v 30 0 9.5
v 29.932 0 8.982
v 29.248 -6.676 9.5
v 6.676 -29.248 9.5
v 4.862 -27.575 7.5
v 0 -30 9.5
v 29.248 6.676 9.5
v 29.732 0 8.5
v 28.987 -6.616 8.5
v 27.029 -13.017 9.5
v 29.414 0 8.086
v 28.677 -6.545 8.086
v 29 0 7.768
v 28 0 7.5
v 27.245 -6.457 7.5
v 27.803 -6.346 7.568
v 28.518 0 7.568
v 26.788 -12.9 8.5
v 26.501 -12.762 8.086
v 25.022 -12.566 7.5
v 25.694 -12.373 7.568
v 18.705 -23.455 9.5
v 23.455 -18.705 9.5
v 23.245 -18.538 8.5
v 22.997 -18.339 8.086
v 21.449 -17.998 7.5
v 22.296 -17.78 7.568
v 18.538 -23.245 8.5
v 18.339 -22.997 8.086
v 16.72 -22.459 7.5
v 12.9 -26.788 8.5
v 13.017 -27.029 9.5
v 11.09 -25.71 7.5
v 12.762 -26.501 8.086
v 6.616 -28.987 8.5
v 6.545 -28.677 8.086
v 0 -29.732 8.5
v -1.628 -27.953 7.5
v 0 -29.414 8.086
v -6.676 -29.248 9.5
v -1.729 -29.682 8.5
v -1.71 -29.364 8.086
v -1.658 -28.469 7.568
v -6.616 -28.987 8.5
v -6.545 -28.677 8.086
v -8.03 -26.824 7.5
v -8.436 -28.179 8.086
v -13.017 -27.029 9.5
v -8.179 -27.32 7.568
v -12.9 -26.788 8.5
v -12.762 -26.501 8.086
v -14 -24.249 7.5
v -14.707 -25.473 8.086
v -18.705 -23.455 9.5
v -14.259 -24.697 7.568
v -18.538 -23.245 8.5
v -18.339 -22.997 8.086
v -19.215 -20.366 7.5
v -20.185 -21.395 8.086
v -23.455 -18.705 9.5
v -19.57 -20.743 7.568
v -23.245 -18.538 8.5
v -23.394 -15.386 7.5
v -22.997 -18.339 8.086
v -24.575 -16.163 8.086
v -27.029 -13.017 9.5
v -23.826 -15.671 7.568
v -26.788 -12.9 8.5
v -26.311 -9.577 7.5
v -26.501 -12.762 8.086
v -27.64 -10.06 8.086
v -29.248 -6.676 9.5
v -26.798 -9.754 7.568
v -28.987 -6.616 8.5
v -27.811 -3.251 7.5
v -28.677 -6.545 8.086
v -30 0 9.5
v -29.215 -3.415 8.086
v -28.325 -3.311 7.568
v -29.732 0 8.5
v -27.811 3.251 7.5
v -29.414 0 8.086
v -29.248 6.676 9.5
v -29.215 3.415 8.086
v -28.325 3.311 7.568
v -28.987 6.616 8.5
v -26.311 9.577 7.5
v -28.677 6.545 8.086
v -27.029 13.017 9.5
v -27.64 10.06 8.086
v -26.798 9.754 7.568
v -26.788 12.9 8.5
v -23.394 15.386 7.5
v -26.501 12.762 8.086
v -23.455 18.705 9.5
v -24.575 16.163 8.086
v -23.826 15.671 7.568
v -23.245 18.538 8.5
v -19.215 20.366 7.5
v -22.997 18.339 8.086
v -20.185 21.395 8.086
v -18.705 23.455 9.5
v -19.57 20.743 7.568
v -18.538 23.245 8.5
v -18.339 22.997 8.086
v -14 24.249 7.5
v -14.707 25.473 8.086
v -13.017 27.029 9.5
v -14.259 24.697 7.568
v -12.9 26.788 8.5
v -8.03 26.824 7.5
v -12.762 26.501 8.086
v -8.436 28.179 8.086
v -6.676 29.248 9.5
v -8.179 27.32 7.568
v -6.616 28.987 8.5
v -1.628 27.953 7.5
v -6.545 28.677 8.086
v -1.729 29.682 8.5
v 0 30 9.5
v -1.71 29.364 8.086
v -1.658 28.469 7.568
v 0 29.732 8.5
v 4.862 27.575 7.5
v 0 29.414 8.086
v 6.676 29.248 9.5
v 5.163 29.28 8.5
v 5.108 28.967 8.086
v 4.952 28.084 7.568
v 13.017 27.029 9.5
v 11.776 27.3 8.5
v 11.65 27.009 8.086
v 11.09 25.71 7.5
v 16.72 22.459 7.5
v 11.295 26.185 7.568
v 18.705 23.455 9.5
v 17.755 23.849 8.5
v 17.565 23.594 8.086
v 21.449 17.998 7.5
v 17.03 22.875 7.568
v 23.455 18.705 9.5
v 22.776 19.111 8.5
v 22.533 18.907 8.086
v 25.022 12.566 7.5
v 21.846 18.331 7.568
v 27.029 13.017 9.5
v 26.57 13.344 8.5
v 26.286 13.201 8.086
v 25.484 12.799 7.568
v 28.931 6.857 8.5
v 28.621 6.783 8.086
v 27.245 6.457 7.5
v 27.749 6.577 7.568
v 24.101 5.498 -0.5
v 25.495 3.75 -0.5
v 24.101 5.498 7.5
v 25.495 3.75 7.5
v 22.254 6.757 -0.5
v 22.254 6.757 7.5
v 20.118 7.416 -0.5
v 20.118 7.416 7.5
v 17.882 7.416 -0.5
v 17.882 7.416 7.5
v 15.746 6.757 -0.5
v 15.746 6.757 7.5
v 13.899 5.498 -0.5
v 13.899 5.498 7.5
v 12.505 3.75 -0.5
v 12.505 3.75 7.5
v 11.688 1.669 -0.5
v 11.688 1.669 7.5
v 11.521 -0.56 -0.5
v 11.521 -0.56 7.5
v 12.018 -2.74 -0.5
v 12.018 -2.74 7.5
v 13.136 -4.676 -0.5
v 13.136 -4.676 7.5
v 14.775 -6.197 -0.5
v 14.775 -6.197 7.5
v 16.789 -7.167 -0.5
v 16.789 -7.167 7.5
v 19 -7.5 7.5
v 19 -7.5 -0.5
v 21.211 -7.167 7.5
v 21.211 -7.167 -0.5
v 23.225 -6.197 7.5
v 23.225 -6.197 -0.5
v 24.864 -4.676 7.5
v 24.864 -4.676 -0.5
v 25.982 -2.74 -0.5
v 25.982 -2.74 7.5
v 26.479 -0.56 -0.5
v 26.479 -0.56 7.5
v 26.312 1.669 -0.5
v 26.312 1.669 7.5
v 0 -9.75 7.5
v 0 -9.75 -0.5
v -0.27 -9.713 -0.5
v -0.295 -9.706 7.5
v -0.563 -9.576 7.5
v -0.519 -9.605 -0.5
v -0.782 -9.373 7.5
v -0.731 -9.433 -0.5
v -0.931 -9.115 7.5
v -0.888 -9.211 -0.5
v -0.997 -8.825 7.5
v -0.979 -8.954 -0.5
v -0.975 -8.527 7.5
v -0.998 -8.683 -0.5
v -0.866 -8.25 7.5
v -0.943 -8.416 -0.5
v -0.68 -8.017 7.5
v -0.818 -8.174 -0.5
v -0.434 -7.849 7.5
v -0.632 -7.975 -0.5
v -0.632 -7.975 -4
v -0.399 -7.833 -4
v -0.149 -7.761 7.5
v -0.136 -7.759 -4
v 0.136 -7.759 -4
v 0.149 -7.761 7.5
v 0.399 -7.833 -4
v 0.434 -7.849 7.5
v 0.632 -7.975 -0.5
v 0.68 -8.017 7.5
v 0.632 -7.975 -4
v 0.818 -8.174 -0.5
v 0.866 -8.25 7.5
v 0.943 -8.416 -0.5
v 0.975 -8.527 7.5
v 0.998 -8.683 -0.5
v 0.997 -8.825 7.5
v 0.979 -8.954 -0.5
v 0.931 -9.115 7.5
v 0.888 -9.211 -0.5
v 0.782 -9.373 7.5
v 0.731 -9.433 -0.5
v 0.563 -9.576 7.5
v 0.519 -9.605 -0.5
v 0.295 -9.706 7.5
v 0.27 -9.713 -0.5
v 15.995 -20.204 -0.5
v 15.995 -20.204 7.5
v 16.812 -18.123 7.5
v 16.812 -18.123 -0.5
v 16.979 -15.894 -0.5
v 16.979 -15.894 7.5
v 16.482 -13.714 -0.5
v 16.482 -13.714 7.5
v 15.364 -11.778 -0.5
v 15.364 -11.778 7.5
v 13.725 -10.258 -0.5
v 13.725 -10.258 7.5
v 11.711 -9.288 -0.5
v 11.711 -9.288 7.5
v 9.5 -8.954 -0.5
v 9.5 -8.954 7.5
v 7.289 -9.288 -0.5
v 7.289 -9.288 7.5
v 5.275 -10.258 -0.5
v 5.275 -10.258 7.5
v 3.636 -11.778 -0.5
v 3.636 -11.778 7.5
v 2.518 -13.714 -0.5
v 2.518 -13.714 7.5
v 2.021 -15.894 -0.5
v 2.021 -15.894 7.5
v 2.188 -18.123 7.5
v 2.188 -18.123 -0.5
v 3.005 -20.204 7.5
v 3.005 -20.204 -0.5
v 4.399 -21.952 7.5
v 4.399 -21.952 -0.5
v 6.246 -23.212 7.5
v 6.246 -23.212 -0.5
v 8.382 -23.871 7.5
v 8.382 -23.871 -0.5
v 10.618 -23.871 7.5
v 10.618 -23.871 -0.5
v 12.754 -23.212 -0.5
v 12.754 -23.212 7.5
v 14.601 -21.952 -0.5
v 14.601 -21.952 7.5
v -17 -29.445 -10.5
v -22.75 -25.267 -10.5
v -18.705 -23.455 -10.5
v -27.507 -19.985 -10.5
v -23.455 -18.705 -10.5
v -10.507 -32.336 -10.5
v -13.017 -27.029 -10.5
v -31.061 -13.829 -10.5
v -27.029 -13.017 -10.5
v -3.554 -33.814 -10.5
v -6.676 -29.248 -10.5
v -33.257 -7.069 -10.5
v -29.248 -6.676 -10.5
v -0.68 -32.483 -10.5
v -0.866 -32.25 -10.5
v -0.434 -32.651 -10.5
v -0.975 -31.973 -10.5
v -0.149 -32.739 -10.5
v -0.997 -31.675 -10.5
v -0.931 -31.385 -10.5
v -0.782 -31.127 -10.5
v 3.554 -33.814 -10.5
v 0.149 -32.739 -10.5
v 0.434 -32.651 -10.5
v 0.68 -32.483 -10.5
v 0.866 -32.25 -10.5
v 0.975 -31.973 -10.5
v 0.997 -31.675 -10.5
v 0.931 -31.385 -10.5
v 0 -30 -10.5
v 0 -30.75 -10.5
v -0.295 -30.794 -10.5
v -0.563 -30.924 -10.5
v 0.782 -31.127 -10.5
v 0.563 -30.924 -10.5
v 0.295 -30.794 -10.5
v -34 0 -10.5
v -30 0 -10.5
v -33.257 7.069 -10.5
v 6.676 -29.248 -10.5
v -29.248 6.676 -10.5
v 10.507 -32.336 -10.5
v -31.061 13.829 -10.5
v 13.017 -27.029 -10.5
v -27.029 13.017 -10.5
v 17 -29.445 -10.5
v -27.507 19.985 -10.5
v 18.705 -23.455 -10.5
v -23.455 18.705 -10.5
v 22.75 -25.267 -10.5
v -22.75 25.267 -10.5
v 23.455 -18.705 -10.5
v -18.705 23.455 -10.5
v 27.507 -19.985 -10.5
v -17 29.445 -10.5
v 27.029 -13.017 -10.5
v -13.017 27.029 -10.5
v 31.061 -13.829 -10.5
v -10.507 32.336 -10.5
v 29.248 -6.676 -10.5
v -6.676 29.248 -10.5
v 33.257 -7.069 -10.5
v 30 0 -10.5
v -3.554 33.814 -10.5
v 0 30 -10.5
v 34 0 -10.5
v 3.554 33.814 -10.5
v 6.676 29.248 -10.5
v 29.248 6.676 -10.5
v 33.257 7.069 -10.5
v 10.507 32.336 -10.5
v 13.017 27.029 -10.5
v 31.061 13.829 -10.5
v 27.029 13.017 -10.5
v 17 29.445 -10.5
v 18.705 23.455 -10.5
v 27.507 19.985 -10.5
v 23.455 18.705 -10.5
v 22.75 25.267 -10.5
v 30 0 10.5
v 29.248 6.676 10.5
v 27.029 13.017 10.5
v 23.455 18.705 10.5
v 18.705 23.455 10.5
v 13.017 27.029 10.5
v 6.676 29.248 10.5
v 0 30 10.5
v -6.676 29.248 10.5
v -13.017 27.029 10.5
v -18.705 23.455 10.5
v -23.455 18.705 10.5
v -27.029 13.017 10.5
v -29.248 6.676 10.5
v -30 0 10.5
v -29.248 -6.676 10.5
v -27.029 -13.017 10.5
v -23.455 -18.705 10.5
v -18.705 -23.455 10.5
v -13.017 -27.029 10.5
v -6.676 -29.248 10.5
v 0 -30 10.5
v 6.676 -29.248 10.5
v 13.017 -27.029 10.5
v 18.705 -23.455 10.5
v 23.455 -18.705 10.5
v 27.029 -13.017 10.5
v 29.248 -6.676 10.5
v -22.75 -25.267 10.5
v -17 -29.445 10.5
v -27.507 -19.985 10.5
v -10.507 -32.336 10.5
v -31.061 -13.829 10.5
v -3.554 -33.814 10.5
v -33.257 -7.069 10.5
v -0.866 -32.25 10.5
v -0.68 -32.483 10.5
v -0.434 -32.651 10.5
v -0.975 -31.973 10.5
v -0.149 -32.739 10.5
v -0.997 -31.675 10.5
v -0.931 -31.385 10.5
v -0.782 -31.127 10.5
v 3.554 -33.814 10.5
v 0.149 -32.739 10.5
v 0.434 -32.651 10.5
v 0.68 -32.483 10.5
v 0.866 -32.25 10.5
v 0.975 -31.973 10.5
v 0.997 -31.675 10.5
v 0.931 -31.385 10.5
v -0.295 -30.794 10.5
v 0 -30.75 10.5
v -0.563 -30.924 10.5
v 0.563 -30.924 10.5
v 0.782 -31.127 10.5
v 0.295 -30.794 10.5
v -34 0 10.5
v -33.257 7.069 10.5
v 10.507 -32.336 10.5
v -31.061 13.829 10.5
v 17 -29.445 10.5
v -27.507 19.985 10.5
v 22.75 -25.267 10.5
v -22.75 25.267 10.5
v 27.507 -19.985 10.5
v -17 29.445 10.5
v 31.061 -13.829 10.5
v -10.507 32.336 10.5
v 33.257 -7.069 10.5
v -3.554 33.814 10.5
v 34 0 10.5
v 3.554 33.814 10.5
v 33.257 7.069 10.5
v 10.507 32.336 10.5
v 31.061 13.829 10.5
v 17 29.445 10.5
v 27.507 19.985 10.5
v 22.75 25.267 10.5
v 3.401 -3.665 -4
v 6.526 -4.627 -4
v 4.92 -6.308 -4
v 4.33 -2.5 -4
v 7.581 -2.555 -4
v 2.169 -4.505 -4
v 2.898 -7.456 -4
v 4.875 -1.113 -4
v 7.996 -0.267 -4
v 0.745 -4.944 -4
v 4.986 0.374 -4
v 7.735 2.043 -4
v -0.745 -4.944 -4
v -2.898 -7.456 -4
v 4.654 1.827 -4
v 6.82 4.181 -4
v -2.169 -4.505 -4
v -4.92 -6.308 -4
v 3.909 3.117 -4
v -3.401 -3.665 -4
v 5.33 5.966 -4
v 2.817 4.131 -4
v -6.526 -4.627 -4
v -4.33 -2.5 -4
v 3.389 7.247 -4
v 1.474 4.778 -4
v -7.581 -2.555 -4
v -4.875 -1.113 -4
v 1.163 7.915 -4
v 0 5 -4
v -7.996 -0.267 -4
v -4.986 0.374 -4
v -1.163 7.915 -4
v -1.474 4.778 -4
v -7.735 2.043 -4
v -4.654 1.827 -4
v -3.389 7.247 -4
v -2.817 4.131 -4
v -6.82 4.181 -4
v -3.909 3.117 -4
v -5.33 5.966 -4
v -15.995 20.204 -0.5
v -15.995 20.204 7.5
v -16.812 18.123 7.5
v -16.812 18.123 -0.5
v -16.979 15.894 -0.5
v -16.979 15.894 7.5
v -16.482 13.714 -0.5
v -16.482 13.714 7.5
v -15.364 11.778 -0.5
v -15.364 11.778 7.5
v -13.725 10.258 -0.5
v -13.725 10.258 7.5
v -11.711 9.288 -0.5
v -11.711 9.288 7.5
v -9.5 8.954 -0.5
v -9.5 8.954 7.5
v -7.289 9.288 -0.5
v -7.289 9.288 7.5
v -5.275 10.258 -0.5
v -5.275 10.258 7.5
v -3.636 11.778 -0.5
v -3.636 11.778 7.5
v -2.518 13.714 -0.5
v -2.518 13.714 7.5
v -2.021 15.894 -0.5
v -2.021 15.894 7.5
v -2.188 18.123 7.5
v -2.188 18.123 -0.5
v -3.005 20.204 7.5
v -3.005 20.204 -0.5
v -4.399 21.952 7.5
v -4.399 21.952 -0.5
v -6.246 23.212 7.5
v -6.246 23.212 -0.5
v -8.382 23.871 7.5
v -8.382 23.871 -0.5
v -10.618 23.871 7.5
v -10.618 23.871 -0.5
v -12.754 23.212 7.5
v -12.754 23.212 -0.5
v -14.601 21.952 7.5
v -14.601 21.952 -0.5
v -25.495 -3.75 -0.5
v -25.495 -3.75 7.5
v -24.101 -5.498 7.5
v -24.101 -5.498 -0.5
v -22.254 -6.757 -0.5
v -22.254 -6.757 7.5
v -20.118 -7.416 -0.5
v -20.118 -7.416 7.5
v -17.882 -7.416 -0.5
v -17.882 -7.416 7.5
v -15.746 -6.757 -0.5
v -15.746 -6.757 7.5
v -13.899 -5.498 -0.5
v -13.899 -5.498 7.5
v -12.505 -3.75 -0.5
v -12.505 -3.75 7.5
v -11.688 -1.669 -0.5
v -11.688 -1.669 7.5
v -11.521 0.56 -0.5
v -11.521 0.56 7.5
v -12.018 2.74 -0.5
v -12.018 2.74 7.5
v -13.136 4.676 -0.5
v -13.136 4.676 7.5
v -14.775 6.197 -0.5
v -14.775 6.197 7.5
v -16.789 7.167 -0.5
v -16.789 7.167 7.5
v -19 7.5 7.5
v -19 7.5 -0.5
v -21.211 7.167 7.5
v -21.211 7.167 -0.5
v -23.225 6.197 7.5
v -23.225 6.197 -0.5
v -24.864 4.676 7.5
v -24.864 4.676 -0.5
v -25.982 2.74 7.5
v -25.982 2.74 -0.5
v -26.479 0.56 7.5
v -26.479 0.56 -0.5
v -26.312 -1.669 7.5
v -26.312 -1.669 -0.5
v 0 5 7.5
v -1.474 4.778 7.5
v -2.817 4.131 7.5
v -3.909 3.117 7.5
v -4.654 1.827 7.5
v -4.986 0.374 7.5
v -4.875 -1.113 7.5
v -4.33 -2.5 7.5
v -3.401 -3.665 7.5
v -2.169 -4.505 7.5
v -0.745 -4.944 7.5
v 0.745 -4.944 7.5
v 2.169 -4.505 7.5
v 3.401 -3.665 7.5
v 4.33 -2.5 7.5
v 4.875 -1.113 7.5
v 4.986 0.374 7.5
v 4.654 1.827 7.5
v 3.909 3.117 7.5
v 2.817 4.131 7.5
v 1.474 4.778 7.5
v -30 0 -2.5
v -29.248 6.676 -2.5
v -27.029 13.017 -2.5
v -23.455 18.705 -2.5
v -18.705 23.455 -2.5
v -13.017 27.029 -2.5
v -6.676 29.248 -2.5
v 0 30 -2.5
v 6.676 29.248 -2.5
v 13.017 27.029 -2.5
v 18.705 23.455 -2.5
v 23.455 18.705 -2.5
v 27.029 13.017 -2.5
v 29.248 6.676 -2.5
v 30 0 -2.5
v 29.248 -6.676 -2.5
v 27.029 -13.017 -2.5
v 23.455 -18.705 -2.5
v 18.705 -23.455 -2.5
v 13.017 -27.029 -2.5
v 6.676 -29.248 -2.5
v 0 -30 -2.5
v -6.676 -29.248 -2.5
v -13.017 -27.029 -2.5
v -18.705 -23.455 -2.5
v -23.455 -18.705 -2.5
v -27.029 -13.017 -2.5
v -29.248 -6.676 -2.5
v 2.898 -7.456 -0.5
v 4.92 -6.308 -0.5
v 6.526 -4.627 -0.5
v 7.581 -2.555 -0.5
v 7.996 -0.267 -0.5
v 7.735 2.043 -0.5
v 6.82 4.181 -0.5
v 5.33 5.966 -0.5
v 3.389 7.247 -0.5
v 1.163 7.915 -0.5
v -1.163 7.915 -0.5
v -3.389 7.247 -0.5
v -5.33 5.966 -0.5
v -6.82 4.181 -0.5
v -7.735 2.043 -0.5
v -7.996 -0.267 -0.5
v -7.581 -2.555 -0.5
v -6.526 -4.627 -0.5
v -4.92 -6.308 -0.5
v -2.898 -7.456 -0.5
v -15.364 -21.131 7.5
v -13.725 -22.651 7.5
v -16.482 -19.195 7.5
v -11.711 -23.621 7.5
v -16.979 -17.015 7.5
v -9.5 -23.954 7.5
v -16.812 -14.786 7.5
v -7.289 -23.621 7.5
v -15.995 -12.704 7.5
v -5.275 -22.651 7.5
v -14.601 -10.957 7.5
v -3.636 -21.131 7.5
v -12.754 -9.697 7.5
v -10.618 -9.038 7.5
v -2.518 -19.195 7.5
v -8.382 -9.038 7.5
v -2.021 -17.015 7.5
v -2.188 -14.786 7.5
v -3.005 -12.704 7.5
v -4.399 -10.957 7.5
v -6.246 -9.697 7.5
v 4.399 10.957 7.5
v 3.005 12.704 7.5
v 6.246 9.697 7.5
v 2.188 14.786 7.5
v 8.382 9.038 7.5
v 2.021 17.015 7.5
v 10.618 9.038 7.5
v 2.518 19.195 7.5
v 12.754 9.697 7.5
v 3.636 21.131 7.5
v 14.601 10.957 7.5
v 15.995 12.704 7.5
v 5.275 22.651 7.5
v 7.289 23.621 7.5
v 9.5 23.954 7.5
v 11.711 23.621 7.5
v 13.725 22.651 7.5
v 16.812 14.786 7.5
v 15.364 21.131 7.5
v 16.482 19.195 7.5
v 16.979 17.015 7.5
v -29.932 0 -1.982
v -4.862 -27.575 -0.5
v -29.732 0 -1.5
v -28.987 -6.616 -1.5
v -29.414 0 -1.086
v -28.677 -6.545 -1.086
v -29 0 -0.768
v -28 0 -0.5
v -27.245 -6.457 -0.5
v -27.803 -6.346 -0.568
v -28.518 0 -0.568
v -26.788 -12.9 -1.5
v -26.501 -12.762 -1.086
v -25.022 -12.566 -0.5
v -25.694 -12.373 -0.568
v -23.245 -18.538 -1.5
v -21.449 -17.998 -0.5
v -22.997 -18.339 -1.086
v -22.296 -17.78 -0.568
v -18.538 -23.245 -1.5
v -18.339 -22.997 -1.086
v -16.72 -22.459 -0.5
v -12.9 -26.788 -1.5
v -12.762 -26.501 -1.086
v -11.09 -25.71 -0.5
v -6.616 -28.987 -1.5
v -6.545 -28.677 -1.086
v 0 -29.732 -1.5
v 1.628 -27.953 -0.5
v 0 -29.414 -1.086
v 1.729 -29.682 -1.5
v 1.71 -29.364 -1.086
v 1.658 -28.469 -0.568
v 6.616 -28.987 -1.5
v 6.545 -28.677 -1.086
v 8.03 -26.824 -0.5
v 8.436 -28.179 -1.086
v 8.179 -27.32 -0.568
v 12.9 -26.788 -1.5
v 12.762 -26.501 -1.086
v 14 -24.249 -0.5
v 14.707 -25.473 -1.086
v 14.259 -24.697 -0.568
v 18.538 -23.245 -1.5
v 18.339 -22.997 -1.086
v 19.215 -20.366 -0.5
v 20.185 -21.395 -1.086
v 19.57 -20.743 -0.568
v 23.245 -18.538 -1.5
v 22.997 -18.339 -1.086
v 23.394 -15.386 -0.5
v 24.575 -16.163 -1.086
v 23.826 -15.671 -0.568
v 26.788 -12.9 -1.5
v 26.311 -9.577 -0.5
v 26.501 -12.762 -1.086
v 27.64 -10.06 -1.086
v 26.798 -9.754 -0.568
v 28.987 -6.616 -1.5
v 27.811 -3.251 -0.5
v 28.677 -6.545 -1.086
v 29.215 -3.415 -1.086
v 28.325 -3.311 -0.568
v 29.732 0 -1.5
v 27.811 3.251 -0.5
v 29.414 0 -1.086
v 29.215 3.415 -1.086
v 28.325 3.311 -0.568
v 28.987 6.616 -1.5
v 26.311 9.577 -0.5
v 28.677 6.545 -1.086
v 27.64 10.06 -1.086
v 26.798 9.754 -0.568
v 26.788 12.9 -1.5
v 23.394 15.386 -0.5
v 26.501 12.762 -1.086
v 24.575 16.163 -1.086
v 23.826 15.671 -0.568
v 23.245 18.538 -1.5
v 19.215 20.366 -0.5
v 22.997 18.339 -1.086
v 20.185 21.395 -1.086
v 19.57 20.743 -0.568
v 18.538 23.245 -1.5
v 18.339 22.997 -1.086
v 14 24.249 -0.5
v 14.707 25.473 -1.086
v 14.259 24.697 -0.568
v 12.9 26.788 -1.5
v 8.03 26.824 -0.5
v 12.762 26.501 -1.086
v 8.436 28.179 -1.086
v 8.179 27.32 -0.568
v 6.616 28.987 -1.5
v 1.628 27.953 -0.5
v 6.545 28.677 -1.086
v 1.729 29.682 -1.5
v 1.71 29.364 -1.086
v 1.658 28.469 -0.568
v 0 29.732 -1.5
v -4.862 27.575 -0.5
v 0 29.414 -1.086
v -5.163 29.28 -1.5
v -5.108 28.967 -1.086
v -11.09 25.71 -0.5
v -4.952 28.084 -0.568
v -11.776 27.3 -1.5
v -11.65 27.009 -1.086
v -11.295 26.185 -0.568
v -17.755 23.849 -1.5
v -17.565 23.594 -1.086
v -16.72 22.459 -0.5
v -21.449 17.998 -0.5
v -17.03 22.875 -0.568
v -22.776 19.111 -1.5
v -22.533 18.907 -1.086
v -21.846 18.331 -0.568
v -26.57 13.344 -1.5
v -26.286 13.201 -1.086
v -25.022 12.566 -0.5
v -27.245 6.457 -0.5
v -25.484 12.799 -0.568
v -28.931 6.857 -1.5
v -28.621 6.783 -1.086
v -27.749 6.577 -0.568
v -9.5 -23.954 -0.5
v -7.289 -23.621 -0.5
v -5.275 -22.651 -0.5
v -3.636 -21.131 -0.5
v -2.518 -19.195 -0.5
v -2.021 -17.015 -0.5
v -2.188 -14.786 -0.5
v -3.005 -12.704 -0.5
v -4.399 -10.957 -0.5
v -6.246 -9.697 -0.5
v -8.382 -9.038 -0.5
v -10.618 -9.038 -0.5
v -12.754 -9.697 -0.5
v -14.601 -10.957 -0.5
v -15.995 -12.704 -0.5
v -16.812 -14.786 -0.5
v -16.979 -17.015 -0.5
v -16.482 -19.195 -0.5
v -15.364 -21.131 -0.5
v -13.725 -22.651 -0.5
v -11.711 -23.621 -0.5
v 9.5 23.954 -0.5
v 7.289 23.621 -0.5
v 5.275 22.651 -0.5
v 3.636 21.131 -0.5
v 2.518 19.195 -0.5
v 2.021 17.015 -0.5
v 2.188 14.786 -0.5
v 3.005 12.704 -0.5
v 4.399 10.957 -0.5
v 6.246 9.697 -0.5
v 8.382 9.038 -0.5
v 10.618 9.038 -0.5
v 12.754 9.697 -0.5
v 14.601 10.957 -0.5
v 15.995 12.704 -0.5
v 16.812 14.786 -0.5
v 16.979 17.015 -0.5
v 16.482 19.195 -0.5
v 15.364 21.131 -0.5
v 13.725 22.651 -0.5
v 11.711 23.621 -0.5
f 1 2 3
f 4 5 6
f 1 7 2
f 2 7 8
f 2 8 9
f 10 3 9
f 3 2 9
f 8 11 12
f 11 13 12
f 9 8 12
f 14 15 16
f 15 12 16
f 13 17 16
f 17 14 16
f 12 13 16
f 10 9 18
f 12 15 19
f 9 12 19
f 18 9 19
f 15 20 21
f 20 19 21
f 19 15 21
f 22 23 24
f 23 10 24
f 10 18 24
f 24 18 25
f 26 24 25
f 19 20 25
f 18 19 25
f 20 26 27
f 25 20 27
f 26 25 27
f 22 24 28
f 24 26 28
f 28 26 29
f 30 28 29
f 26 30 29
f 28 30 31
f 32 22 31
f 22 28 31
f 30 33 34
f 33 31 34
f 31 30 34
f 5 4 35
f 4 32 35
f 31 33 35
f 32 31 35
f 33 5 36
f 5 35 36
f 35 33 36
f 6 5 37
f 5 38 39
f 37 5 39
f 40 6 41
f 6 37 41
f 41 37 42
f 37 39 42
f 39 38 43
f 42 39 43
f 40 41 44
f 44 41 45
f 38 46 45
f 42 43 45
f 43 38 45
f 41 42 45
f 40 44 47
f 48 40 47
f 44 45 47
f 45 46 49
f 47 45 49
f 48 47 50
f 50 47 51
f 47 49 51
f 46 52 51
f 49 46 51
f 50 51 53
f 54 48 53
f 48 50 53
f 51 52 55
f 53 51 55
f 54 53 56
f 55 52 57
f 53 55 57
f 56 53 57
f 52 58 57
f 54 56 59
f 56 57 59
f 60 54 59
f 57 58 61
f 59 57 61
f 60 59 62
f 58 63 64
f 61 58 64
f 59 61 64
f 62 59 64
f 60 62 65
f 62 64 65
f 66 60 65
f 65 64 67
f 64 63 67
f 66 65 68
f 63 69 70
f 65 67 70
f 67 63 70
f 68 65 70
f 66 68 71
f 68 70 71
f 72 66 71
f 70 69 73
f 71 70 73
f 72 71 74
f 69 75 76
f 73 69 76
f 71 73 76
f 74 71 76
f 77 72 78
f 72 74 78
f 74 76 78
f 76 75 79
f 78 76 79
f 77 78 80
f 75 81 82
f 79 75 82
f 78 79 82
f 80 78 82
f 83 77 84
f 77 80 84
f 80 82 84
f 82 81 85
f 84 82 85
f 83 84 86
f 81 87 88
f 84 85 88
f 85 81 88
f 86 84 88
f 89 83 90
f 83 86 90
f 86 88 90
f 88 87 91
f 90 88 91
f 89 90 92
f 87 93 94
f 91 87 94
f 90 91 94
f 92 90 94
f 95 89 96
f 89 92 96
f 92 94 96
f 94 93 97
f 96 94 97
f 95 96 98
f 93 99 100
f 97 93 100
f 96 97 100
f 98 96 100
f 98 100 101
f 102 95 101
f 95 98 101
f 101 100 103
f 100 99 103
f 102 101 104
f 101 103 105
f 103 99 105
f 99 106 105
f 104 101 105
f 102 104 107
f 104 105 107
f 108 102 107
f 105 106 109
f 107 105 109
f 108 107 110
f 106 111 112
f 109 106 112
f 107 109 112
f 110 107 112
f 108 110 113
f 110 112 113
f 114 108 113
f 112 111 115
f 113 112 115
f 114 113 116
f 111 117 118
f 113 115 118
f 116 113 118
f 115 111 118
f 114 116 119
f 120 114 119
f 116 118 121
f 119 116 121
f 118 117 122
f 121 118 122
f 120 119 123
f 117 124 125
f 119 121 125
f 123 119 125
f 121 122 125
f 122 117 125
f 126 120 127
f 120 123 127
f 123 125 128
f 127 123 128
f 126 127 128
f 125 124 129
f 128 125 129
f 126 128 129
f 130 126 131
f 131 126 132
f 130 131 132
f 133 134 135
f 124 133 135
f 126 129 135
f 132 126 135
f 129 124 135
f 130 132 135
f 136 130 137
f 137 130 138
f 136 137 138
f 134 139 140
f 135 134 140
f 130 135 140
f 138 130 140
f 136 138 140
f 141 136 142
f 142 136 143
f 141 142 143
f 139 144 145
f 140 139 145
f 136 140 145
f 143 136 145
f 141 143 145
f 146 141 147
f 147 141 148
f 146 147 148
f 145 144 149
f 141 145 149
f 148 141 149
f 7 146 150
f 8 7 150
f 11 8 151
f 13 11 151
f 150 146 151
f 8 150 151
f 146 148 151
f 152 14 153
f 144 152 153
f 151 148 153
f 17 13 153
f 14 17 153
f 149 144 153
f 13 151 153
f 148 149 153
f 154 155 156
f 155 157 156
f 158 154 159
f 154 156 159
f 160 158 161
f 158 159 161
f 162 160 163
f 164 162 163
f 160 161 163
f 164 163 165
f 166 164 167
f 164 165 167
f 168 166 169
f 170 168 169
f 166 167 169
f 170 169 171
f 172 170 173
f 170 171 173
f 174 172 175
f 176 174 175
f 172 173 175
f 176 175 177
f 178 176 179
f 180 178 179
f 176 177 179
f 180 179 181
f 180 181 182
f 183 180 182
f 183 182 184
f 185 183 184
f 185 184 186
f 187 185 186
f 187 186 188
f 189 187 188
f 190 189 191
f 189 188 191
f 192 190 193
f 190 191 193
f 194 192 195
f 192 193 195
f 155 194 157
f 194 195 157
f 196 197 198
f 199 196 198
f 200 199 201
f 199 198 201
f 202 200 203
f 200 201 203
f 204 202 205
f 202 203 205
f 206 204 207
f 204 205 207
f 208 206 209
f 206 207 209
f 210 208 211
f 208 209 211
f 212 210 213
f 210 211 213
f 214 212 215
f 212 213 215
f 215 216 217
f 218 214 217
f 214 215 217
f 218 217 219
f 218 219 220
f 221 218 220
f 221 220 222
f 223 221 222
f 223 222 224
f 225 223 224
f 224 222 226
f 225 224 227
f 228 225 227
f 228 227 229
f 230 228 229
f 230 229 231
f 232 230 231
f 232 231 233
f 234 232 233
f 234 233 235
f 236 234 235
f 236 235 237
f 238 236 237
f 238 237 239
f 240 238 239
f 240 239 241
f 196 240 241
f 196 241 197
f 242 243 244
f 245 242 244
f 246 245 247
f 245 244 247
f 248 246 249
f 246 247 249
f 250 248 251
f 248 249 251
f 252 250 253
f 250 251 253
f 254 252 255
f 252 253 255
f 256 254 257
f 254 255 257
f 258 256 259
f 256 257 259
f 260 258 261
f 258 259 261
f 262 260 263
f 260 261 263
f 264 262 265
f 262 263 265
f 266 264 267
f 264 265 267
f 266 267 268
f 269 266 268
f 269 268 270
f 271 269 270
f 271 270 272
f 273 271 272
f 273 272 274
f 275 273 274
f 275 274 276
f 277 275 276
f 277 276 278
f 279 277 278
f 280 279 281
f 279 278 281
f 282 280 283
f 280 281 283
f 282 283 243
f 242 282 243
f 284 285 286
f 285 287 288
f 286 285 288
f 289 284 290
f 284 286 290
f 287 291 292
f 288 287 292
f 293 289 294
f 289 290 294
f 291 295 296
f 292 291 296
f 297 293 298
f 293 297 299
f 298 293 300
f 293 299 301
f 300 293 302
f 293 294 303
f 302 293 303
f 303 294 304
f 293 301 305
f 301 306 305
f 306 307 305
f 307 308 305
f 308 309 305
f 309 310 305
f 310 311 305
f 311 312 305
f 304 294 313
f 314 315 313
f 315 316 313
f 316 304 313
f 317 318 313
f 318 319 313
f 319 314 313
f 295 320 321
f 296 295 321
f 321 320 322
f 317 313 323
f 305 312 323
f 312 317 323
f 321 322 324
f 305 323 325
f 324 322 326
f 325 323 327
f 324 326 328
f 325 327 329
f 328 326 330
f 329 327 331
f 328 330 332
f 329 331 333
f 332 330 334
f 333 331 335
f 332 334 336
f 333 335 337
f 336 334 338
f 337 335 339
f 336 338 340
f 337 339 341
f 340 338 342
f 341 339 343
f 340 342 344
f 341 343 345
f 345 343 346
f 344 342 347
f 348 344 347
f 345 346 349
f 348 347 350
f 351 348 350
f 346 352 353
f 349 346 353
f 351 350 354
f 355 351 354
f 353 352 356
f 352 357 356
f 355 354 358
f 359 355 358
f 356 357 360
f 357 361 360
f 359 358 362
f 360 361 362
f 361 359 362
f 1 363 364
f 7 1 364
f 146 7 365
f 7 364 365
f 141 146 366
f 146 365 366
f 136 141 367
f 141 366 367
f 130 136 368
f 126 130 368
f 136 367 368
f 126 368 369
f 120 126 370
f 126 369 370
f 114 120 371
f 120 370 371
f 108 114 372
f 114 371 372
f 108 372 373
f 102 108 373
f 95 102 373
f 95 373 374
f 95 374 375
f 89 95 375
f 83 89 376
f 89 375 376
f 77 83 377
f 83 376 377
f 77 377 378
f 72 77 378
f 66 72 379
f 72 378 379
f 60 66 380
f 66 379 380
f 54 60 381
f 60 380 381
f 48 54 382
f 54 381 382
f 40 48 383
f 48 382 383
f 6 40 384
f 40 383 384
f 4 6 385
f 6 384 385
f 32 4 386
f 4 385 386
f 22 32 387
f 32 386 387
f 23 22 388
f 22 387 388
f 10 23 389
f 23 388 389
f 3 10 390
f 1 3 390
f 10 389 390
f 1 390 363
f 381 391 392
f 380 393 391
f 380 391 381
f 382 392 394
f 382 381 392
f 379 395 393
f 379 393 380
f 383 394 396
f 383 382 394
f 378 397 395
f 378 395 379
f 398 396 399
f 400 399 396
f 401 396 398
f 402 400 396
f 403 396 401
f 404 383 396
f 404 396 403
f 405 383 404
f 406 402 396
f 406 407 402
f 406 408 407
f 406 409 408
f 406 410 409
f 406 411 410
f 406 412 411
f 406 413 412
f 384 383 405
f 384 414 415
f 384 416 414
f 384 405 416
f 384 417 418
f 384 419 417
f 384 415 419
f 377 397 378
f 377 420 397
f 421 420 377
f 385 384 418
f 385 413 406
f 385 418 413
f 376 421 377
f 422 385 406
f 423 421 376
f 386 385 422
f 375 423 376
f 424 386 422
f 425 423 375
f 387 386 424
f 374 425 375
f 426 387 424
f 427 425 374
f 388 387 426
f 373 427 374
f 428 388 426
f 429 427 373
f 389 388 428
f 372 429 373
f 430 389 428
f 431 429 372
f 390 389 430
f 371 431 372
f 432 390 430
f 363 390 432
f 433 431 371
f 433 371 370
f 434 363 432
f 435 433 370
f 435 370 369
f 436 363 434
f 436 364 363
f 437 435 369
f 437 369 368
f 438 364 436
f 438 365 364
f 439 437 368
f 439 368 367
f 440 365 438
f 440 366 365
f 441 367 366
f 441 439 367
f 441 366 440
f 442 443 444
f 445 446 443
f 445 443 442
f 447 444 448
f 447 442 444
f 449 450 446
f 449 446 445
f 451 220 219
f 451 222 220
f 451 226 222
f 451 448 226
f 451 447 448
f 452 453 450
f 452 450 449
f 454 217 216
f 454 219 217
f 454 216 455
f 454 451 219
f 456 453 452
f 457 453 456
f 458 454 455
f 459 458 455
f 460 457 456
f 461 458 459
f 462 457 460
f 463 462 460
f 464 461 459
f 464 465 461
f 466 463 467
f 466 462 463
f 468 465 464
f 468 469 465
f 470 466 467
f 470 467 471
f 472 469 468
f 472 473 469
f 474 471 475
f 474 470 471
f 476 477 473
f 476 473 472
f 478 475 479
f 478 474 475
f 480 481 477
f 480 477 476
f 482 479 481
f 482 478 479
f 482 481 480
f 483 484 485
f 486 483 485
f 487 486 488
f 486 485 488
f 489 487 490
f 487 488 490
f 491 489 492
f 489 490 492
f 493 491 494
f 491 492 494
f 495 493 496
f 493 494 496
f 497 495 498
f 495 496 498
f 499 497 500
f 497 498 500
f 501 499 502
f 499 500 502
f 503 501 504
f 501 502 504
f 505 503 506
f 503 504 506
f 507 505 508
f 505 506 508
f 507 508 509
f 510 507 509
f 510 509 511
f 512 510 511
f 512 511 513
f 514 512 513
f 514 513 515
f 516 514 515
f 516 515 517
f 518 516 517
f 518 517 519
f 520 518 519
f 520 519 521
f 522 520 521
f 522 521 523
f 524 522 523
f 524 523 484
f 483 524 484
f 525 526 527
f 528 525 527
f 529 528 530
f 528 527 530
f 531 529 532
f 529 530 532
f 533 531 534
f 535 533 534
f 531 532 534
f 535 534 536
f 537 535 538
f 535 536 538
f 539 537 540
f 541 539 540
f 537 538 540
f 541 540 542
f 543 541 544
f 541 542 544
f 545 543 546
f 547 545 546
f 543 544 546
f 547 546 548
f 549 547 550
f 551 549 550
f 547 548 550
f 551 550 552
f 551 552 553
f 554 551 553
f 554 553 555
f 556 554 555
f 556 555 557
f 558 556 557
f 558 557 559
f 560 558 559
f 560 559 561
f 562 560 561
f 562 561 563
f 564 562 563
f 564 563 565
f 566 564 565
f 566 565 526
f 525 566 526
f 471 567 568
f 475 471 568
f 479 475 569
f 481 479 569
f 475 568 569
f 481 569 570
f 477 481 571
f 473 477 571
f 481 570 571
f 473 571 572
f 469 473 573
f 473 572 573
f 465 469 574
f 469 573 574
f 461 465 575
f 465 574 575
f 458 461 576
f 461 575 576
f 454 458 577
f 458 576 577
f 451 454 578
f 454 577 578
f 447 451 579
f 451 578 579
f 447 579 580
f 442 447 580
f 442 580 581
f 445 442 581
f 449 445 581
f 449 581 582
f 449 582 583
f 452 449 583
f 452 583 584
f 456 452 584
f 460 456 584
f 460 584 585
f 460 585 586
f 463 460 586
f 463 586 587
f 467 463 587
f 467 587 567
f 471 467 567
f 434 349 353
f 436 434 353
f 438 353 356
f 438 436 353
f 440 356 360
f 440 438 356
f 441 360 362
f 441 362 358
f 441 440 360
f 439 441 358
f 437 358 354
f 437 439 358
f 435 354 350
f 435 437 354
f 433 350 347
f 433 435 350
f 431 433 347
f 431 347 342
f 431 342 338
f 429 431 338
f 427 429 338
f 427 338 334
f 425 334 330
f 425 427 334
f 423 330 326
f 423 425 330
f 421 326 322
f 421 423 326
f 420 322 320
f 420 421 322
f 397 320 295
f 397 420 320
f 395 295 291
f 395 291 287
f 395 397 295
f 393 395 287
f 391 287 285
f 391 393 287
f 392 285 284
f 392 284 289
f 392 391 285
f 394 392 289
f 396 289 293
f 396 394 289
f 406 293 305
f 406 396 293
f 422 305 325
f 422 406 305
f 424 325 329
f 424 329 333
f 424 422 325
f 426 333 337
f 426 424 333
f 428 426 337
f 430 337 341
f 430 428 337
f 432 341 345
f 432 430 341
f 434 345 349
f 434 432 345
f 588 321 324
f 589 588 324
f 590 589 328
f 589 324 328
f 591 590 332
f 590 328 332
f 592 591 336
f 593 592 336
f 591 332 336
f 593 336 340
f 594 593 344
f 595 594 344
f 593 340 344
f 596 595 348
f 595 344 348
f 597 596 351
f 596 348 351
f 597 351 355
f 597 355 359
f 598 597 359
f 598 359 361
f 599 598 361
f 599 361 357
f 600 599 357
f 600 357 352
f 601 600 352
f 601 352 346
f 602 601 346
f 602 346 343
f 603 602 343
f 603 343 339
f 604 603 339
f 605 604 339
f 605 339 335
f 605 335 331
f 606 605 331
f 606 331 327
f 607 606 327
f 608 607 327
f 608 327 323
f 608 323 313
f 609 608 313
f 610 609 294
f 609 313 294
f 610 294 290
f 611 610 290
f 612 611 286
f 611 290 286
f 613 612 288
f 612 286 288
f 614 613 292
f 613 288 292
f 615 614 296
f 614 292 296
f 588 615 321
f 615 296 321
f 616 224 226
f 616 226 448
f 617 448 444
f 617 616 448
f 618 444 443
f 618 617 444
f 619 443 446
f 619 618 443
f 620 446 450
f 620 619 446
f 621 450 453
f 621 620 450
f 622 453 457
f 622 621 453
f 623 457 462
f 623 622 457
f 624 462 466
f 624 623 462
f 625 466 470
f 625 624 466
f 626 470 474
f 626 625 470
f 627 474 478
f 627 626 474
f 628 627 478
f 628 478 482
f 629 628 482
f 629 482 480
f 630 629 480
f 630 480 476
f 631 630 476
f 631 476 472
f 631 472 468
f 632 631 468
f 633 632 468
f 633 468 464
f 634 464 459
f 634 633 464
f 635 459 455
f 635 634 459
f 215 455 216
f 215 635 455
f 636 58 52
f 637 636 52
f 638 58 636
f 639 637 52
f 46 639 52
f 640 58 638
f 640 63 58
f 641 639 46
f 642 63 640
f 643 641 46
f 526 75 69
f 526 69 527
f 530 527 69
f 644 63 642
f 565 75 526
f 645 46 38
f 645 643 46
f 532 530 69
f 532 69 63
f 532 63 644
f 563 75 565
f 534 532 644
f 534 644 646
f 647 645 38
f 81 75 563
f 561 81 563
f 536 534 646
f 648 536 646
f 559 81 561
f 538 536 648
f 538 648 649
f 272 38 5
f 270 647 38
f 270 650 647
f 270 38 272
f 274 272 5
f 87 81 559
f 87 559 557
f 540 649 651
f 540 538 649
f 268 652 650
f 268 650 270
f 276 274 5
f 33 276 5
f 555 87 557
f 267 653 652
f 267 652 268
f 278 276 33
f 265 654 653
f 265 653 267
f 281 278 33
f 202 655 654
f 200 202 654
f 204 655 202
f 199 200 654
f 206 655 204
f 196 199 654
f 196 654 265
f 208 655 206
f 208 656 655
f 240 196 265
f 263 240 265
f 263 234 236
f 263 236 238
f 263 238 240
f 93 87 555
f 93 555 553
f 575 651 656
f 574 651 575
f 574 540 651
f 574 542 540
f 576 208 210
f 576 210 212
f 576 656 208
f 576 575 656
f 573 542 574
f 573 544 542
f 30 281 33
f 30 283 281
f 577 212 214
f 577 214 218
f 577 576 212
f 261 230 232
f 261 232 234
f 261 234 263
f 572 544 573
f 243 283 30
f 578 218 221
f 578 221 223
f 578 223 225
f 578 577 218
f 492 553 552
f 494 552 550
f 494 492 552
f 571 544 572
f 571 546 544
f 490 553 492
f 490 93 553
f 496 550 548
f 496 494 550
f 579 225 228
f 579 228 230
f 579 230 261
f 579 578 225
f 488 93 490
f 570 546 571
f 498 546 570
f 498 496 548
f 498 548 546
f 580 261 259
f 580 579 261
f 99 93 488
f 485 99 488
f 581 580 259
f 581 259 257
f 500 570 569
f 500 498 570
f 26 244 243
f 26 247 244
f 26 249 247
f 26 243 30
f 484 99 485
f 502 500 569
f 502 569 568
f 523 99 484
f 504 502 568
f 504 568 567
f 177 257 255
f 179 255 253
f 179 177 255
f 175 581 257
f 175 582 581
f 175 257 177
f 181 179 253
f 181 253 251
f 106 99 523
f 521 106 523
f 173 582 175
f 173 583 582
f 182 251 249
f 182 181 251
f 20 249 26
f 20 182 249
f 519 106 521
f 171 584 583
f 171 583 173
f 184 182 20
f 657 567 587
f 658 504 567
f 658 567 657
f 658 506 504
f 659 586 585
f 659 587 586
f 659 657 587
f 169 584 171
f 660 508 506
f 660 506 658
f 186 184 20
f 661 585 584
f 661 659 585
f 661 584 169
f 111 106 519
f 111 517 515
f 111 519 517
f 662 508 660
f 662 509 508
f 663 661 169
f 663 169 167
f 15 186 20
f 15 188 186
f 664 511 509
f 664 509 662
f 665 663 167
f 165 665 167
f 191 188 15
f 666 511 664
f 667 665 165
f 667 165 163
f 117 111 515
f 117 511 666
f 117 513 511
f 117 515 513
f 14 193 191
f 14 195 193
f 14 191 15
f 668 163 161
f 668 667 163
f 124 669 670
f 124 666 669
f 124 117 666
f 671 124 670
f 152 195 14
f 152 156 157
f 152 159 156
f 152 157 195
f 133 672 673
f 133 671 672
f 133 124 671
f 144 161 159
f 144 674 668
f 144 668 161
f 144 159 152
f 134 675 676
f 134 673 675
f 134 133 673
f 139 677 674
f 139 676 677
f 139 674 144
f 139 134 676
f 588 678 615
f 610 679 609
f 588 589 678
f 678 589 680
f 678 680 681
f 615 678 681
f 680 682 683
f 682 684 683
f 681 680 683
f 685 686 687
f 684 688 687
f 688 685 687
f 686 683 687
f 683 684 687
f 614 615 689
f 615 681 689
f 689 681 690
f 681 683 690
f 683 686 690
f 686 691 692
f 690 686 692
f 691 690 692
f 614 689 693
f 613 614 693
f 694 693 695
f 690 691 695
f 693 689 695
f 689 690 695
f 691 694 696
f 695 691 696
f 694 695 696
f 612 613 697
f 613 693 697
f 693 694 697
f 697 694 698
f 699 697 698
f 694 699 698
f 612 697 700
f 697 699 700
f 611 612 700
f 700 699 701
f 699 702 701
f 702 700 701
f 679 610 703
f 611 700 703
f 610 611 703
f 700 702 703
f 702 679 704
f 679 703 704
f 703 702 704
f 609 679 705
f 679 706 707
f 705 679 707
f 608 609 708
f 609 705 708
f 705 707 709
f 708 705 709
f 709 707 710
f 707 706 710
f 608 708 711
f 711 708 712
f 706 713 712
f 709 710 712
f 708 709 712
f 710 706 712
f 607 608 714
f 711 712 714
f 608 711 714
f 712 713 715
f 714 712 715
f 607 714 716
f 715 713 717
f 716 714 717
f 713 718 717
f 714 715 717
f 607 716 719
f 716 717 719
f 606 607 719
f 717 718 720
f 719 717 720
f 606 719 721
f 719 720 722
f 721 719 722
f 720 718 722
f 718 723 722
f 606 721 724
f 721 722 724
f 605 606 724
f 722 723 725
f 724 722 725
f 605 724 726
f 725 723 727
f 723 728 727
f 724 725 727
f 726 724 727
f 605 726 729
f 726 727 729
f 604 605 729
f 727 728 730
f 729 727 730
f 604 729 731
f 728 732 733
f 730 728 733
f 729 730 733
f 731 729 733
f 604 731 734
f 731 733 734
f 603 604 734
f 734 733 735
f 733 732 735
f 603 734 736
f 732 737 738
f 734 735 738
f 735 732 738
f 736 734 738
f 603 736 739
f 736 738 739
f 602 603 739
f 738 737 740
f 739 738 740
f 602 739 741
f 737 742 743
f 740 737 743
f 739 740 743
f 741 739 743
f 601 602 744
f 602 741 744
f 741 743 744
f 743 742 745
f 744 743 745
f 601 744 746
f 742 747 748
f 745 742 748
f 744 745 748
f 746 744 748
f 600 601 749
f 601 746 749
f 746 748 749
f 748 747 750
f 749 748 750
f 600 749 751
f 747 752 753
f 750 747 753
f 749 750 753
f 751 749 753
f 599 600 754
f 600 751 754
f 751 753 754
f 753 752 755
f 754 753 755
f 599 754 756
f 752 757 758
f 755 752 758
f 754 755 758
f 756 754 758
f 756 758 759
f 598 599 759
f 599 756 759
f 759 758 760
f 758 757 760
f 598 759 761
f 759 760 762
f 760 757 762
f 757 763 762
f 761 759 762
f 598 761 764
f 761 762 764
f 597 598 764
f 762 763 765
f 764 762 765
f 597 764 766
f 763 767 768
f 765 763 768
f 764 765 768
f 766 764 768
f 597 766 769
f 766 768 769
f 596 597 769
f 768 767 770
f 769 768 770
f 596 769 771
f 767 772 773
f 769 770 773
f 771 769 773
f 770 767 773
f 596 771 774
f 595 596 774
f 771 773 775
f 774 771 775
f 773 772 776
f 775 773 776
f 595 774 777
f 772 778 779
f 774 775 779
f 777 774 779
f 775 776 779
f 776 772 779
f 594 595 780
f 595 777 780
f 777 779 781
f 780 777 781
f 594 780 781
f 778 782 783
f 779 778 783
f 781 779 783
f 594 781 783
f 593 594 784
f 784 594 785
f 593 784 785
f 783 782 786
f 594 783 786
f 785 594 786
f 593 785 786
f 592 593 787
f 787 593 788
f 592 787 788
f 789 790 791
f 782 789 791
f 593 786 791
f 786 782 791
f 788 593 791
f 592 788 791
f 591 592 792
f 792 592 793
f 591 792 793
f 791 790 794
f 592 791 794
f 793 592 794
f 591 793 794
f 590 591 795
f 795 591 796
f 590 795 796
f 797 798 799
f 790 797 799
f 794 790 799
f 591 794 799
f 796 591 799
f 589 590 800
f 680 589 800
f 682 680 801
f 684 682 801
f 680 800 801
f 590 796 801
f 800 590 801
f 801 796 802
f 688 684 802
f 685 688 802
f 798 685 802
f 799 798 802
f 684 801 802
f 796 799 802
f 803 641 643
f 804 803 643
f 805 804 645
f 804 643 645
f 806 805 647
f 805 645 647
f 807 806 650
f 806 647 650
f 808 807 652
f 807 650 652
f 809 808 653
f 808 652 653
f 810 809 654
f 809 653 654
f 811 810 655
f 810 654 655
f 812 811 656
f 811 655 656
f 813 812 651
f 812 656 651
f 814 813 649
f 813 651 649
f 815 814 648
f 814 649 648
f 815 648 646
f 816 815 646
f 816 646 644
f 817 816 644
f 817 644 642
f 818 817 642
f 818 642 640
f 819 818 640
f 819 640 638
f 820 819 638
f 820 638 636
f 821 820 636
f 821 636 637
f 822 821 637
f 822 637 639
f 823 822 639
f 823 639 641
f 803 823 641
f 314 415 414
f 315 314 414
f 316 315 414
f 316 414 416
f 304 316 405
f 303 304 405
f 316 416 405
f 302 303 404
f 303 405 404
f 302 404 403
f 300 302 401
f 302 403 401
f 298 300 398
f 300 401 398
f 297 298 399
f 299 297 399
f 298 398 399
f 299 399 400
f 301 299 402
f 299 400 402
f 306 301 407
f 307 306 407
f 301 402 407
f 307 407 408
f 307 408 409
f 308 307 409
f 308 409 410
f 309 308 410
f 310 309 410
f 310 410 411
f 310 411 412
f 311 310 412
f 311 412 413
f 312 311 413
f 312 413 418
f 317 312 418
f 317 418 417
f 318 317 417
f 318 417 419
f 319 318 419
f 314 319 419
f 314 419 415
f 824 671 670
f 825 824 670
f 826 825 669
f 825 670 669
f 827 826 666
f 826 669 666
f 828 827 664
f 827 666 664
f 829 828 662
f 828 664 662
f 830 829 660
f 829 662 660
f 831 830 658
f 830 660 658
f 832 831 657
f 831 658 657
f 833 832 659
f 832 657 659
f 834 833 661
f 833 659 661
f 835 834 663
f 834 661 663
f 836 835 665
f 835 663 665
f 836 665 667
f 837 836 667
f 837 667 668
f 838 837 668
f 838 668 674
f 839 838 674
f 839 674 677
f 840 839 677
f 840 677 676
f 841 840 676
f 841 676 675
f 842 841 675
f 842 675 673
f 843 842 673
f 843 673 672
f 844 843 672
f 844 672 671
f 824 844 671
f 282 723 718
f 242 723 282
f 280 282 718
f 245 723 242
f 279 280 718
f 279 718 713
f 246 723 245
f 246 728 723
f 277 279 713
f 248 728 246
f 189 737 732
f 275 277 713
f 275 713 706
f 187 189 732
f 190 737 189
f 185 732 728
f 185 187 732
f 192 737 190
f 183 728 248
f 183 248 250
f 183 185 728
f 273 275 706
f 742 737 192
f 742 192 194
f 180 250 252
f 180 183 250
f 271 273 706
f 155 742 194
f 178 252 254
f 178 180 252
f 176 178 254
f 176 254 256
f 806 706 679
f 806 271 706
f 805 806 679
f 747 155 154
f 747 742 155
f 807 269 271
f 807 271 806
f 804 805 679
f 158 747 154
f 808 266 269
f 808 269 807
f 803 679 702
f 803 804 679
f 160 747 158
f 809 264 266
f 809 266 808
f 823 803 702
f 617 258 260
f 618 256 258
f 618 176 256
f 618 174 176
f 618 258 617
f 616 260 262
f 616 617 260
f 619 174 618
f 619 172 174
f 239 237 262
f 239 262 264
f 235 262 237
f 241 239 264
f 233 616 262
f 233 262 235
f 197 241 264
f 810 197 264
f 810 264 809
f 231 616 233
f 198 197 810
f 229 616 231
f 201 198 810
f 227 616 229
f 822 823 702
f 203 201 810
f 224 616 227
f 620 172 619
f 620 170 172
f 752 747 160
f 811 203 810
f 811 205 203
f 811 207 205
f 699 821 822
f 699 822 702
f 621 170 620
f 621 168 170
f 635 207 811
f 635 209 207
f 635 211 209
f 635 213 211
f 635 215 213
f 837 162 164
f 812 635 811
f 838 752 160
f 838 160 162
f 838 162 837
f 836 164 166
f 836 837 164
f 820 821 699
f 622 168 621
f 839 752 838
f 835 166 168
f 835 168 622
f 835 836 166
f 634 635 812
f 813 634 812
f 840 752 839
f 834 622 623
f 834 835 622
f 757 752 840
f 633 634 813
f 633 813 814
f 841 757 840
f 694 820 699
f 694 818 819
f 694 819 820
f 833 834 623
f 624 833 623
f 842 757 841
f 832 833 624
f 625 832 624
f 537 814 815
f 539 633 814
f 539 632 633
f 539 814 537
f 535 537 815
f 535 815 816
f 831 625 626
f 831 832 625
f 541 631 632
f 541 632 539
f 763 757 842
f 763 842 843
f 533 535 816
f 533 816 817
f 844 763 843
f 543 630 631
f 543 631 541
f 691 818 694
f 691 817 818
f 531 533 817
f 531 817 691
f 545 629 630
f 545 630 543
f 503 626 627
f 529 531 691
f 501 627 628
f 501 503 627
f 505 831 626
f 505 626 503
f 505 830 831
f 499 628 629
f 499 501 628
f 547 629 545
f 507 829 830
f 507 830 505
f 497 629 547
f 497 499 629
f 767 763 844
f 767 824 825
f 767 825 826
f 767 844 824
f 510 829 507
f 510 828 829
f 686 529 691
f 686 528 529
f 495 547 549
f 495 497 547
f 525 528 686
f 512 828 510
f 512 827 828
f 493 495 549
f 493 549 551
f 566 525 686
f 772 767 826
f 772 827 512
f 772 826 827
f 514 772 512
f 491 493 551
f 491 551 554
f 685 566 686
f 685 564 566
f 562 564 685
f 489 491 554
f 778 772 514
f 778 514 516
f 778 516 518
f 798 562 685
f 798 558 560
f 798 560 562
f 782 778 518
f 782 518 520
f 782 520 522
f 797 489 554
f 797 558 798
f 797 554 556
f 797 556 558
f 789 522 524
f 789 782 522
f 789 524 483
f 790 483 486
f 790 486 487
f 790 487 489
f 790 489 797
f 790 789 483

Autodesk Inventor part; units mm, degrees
ref_plane "YZ Plane" through (0, 0, 0) normal (1, 0, 0) x (0, 1, 0)
ref_plane "XZ Plane" through (0, 0, 0) normal (0, 1, 0) x (-1, 0, 0)
ref_plane "XY Plane" through (0, 0, 0) normal (0, 0, 1) x (1, 0, 0)
sketch "Skizze1" plane through (0, 0, 0) normal (0, 0, 1) x (1, 0, 0)
  circle A0 centre (0, 0) radius 34
  dimension "d0" = 68
extrude "Extrusion1" add sketch "Skizze1" along normal mid plane 21
sketch "Skizze2" plane through (0, 0, 10.5) normal (0, 0, 1) x (1, 0, 0)
  circle A0 centre (0, 0) radius 30
  dimension "d3" = 60
extrude "Extrusion2" cut sketch "Skizze2" against normal blind 3
fillet "Rundung1" radius 2 1 edges at (-30, 0, 7.5)
sketch "Skizze3" plane through (0, 0, -10.5) normal (0, 0, -1) x (-1, 0, 0)
  circle A0 centre (0, 0) radius 30
  dimension "d7" = 60
extrude "Extrusion3" cut sketch "Skizze3" against normal blind 10
fillet "Rundung2" radius 2 1 edges at (30, 0, -0.5)
sketch "Skizze4" plane through (0, 0, -0.5) normal (0, 0, -1) x (-1, 0, 0)
  circle A0 centre (0, 0) radius 8
  dimension "d11" = 16
extrude "Extrusion4" add sketch "Skizze4" along normal blind 3.5
sketch "Skizze5" plane through (0, 0, -4) normal (0, 0, -1) x (-1, 0, 0)
  circle A0 centre (0, 0) radius 8 projected
hole "Bohrung1" at (0, 0, -4) direction (0, 0, 1) diameter 10 depth 11.5
sketch "Skizze6" plane through (0, 0, -0.5) normal (0, 0, -1) x (-1, 0, 0)
  circle A0 centre (0, 0) radius 8 projected
  line L0 (0, 0) -> (0, 46.0089) construction
  circle A1 centre (0, 0) radius 5 projected
  line L1 (0, 0) -> (-23.7907, 41.2067) construction
  circle A2 centre (0, 0) radius 19 construction
  point P0 (-9.5, 16.4545)
  dimension "d22" = 38
  dimension "d21" = 30
hole "Bohrung2" at (9.5, 16.4545, -0.5) direction (0, 0, 1) diameter 15 depth 8
pattern_circular "Runde Anordnung1" count 6 over 360 about axis through (0, 0, -10.5) along (0, 0, 1) of "Bohrung2"
sketch "Skizze7" plane through (0, 0, -10.5) normal (0, 0, -1) x (-1, 0, 0)
  point P0 (0, 0)
  point P1 (0, -31.75)
  dimension "d40" = 31.75
hole "Bohrung3" at (0, -31.75, -10.5) direction (0, 0, 1) diameter 2 end through all
sketch "Skizze8" plane through (0, 0, 7.5) normal (0, 0, 1) x (1, 0, 0)
  point P0 (0, 0)
  point P1 (0, -8.75)
  dimension "d48" = 8.75
hole "Bohrung4" at (0, -8.75, 7.5) direction (0, 0, -1) diameter 2 end through all
properties part number "schwingrad" material "Polypropylen"
